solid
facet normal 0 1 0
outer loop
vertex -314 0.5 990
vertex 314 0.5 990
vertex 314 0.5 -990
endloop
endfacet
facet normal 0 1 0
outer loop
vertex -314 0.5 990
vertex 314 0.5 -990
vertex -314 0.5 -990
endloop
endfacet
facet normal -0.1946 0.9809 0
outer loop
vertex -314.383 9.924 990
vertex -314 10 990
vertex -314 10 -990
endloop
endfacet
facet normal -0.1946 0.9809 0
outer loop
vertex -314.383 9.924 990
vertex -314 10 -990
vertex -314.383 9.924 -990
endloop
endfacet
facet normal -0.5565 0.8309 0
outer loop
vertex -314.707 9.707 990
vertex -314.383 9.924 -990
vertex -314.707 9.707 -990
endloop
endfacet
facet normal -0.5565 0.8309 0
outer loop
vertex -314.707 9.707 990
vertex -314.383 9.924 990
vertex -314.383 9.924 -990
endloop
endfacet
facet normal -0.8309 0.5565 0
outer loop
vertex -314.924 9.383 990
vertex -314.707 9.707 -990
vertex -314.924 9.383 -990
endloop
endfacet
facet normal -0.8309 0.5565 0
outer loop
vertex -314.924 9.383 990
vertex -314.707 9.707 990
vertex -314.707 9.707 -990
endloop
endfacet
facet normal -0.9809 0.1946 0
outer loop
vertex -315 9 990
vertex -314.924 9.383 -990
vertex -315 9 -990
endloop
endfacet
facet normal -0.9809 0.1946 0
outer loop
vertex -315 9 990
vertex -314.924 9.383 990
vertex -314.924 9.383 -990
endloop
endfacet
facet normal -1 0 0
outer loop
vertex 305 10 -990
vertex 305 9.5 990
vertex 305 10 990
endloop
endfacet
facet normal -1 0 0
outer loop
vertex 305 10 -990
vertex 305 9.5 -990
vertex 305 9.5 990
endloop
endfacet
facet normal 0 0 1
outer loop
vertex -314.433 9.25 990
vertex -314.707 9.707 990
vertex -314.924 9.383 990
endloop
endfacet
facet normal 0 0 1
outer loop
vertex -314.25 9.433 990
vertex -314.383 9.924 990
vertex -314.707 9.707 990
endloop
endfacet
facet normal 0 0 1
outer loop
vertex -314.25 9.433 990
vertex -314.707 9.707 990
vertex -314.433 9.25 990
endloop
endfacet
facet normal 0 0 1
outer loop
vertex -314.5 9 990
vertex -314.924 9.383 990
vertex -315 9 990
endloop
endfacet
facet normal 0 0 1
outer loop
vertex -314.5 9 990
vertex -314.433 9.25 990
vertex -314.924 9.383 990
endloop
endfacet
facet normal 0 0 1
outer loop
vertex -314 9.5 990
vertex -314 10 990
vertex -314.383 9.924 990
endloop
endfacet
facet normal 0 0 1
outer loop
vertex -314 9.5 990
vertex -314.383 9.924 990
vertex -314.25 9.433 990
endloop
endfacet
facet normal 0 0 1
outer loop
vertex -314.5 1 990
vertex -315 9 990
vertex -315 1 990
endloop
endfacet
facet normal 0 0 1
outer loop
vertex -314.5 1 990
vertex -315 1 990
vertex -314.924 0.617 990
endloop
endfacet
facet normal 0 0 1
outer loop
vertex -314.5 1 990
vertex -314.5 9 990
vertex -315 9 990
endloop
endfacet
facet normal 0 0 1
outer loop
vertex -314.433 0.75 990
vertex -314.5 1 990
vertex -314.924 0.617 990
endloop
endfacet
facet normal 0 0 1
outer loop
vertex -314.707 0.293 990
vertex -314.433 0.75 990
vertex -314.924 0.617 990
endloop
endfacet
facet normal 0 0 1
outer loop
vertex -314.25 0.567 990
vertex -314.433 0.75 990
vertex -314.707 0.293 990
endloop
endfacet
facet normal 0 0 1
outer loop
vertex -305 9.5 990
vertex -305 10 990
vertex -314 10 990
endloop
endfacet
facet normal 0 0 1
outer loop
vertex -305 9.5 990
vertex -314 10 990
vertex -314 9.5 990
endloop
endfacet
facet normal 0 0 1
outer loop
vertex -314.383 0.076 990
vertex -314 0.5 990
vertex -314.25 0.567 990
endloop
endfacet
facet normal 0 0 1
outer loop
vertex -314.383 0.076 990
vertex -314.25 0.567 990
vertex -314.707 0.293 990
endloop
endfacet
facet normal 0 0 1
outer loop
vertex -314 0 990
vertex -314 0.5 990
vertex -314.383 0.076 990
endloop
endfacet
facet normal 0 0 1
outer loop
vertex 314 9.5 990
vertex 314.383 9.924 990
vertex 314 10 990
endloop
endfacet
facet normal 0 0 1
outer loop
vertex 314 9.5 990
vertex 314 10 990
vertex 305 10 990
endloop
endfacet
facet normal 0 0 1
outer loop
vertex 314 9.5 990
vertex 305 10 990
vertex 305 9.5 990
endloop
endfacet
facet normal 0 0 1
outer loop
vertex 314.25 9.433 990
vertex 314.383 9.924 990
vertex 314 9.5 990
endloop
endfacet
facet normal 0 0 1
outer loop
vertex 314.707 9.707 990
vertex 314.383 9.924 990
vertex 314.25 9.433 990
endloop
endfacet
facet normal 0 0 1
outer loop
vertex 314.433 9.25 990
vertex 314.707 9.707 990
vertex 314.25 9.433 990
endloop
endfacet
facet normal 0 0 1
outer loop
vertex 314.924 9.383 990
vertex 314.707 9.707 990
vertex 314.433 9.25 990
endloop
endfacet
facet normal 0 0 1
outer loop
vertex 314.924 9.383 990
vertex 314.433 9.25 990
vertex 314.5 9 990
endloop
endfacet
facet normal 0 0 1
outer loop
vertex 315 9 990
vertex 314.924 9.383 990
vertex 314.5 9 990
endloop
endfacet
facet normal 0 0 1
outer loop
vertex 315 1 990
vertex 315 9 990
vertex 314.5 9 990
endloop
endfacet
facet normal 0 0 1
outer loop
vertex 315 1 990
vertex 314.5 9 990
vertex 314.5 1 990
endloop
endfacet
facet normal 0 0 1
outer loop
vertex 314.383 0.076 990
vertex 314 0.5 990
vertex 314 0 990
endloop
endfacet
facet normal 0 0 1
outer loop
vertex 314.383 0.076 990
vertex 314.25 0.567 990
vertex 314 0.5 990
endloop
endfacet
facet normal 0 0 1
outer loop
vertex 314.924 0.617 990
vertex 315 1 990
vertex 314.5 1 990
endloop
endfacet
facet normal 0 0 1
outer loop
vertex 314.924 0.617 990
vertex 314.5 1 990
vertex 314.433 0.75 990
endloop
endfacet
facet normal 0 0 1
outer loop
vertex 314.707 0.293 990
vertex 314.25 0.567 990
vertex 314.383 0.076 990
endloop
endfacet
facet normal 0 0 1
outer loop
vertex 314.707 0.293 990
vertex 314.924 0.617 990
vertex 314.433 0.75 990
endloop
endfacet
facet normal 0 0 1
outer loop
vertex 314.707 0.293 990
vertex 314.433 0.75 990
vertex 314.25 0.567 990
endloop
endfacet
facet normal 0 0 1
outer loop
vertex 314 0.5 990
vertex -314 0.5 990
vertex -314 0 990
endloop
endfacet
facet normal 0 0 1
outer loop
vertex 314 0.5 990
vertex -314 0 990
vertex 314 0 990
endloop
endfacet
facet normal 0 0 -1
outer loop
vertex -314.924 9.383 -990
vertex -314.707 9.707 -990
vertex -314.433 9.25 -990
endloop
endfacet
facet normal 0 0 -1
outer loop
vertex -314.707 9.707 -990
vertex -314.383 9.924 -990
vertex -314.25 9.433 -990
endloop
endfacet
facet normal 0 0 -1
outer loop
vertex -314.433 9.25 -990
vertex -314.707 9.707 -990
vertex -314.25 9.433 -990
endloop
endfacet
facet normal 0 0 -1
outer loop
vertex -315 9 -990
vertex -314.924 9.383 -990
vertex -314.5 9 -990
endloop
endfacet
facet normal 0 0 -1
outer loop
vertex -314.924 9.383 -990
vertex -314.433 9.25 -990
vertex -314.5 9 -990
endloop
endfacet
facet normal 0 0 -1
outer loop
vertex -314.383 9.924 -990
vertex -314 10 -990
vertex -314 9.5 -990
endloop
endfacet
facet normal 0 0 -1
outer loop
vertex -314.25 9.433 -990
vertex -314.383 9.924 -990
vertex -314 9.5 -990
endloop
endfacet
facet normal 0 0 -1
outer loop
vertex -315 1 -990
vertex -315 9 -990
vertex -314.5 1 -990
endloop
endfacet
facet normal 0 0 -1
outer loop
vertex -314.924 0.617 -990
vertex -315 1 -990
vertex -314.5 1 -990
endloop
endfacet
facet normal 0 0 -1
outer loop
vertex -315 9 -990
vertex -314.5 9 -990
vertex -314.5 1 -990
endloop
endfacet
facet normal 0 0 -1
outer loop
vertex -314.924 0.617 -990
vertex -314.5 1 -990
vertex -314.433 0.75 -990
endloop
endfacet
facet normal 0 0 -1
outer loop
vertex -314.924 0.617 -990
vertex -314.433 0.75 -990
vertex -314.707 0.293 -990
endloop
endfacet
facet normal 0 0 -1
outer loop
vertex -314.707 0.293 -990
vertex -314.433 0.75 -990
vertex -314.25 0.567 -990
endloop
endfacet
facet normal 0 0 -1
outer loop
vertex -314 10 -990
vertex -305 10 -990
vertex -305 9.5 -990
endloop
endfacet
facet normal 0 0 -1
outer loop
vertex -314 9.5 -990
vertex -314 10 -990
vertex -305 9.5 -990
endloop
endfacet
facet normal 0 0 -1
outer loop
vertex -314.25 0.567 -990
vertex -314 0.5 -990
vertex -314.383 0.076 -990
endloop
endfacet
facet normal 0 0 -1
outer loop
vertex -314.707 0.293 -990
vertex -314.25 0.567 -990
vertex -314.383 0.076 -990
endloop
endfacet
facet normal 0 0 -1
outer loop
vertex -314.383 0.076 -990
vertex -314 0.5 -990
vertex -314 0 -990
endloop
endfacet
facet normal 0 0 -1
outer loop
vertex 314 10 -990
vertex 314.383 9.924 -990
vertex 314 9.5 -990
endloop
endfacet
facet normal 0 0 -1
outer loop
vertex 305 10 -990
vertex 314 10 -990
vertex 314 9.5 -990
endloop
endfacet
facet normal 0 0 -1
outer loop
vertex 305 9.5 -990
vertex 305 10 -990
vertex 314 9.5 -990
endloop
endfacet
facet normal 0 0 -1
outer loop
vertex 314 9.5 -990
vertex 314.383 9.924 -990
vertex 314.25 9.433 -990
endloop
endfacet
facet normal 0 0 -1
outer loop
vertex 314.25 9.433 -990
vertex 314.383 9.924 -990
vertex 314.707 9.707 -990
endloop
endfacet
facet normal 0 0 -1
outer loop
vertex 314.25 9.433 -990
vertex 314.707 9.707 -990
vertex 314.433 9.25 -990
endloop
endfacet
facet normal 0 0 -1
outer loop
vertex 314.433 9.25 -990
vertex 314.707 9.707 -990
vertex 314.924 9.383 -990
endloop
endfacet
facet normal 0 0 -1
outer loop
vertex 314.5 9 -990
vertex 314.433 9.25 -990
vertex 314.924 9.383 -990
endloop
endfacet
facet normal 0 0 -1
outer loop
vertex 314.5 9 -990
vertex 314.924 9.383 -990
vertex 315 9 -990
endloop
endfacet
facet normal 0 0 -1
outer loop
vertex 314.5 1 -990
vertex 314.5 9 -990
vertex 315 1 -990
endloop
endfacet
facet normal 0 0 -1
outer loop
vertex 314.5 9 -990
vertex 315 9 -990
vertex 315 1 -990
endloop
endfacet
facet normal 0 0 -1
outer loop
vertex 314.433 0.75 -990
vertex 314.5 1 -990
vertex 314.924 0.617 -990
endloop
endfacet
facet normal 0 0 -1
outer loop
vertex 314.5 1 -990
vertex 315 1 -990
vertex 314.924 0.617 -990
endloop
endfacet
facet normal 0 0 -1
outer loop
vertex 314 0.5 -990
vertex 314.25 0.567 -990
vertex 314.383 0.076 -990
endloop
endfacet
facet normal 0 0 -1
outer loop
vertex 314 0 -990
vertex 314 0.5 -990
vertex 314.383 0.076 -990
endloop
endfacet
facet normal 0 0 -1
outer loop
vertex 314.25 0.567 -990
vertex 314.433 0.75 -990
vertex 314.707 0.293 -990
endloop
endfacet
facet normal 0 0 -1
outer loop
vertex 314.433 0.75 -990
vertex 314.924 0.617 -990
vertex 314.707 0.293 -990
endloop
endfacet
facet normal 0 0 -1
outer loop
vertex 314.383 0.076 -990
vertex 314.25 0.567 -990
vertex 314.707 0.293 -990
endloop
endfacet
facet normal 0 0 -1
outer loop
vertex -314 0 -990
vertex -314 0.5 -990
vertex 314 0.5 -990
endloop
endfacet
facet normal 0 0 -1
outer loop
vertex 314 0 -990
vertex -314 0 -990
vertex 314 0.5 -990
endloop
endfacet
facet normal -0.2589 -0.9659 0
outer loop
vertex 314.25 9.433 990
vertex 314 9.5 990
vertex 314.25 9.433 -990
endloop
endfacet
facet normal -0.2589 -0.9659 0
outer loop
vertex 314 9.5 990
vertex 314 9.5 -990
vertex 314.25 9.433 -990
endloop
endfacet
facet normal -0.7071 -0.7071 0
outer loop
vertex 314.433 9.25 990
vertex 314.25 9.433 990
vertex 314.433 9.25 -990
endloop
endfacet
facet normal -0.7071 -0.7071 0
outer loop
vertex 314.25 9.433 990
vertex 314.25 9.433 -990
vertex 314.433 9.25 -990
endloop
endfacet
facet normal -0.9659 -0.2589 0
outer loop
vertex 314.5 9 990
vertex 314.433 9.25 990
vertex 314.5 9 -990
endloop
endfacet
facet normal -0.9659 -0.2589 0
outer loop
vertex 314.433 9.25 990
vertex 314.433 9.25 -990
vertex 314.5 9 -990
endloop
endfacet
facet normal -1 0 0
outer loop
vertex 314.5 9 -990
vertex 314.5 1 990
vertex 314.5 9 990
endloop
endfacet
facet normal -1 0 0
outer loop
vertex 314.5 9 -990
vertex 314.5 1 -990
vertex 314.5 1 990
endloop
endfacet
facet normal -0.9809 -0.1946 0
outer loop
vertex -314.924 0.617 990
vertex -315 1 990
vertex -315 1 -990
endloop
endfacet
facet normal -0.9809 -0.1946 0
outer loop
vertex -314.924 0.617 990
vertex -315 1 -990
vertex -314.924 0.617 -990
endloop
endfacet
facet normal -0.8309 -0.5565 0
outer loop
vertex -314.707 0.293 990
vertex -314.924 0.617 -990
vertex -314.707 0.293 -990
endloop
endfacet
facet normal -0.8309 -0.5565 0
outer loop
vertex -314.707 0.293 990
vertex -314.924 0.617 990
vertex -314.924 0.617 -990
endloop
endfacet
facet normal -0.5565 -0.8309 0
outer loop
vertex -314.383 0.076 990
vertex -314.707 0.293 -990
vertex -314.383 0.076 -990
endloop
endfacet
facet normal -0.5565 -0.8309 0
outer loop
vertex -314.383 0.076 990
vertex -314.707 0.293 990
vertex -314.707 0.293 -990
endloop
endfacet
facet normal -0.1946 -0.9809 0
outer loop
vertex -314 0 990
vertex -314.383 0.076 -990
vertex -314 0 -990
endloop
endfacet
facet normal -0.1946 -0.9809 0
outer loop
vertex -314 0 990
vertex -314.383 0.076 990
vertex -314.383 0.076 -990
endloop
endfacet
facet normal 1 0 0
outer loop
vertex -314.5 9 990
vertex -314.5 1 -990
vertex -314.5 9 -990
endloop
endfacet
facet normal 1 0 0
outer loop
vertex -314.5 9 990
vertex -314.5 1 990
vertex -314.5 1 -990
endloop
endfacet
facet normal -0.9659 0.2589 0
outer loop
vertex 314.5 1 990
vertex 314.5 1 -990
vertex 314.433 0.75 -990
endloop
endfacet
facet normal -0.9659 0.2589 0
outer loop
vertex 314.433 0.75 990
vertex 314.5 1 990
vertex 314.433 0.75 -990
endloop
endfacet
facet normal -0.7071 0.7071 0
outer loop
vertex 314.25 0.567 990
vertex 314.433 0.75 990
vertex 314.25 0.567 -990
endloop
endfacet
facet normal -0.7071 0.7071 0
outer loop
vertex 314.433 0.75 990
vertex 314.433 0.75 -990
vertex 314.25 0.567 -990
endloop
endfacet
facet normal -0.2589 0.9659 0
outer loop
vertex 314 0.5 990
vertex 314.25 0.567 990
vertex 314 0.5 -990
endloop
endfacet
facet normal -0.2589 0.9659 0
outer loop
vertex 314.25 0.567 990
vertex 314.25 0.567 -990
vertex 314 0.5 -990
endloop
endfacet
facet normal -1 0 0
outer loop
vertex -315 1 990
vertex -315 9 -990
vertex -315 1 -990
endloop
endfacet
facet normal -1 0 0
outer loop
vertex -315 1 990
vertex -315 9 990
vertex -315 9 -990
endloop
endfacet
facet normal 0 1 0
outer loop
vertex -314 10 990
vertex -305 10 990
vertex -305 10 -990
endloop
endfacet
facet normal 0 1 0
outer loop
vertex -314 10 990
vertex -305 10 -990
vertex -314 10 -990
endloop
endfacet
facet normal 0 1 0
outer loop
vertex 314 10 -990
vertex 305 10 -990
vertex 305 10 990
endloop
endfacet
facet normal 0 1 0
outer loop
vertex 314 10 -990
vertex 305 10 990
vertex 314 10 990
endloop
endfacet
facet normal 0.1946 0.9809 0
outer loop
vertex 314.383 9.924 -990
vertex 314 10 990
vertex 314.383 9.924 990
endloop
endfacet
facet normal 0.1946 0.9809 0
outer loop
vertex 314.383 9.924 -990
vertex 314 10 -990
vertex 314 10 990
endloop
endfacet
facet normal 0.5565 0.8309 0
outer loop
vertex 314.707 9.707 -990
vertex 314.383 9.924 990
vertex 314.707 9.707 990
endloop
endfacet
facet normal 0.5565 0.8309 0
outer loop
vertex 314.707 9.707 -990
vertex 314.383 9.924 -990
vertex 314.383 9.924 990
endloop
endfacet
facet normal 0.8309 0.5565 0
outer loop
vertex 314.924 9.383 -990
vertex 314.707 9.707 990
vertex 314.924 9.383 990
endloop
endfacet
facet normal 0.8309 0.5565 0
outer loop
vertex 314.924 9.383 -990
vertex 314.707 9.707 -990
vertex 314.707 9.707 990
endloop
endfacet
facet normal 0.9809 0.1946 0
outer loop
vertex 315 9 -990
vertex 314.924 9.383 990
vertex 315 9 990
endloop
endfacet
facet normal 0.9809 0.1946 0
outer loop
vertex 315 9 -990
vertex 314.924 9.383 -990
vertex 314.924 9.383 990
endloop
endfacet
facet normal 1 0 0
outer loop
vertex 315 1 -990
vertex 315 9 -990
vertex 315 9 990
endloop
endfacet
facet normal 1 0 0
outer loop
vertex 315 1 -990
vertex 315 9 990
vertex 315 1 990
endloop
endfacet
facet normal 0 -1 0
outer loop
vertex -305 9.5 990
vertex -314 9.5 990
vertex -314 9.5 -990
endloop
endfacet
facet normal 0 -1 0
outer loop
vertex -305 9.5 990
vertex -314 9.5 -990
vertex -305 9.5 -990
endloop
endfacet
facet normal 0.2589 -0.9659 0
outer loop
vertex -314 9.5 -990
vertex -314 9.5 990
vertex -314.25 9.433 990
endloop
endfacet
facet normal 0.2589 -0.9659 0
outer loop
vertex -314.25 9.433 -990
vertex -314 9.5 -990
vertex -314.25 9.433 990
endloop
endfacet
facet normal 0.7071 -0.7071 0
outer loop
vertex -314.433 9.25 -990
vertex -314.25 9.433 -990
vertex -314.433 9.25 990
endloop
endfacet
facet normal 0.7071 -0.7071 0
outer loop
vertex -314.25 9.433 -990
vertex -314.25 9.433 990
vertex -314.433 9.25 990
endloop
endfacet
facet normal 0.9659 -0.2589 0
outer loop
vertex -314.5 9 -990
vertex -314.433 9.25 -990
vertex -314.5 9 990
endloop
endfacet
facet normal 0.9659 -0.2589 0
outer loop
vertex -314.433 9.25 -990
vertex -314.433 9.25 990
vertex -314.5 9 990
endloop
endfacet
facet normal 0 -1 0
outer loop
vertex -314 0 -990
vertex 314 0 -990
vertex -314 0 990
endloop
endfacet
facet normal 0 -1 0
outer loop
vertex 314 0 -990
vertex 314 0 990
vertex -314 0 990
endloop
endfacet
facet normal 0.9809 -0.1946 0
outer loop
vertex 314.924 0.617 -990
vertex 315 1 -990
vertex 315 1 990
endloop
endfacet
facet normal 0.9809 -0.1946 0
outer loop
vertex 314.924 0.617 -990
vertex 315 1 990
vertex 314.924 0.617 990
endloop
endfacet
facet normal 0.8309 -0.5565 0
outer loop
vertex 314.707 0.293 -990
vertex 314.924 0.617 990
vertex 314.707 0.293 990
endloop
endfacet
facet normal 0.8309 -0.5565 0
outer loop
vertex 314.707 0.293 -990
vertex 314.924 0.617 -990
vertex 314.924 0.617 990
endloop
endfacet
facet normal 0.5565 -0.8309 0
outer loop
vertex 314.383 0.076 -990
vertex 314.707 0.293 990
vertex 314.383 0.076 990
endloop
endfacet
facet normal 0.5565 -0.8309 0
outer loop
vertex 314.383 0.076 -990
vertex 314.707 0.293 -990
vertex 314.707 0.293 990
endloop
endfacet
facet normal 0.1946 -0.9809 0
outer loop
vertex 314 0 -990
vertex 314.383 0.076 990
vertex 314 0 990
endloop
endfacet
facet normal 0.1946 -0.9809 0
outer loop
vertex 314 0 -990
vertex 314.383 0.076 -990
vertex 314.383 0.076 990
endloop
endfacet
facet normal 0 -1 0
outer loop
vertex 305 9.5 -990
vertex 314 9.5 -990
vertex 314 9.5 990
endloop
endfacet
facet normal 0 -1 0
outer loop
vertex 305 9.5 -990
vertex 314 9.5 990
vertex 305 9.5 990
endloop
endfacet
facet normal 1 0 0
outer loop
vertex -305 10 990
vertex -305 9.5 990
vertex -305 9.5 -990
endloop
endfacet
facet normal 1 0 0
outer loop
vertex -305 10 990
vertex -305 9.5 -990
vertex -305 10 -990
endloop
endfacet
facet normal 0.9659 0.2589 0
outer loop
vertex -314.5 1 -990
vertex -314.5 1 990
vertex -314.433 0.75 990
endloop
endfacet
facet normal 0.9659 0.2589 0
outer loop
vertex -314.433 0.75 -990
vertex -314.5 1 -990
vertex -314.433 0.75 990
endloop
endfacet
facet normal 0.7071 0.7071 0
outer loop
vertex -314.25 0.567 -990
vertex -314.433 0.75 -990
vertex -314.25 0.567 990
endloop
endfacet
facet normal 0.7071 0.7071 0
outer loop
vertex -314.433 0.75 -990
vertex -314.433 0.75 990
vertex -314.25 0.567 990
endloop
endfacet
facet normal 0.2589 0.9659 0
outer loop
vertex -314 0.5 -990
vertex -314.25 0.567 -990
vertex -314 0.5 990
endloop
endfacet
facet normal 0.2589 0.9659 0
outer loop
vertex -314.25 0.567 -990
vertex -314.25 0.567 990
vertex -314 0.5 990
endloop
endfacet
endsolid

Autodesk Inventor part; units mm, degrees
ref_plane "YZ Plane" through (0, 0, 0) normal (1, 0, 0) x (0, 1, 0)
ref_plane "XZ Plane" through (0, 0, 0) normal (0, 1, 0) x (-1, 0, 0)
ref_plane "XY Plane" through (0, 0, 0) normal (0, 0, 1) x (1, 0, 0)
sketch "Sketch6" plane through (0, 0, 0) normal (0, 1, 0) x (-1, 0, 0)
  line L0 (315, -990) -> (-315, -990)
  line L1 (-315, -990) -> (-315, 990)
  line L2 (-315, 990) -> (315, 990)
  line L3 (315, 990) -> (315, -990)
  line L4 (315, -990) -> (-315, 990) construction
  line L5 (-315, -990) -> (315, 990) construction
  point P0 (0, 0)
  dimension "d52" = 630
  dimension "d53" = 1980
extrude "Plate2" add sketch "Sketch6" along normal blind 0.5
sketch "Sketch11" plane through (314.5, 0, -990) normal (1, 0, 0) x (0, 1, 0)
  line L0 (0, 1980) -> (0, 0)
  line L1 (0, 0) -> (10, 0)
  line L2 (10, 0) -> (10, 1980)
  line L3 (10, 1980) -> (0, 1980)
edge flange "Flange2" height 10 angle 90 thickness 0.5 bend radius 0.5 thickness toward (1, 0, 0) relief tear relief width 0.5 relief depth 0.25 edges at (315, 0.5, 0) wall of the first edge with corners at (314.5, 0, 990) (314.5, 0, -990) (314.5, 10, -990) (314.5, 10, 990)
bend "Bend3"
corner "Corner3"
sketch "Sketch12" plane through (315, 9.5, -990) normal (0, 1, 0) x (-1, 0, 0)
  line L0 (0, 1980) -> (0, 0)
  line L1 (0, 0) -> (10, 0)
  line L2 (10, 0) -> (10, 1980)
  line L3 (10, 1980) -> (0, 1980)
edge flange "Flange3" height 10 angle 90 thickness 0.5 bend radius 0.5 thickness toward (0, 1, 0) relief tear relief width 0.5 relief depth 0.25 edges at (314.5, 10, 0) wall of the first edge with corners at (315, 9.5, 990) (315, 9.5, -990) (305, 9.5, -990) (305, 9.5, 990)
bend "Bend4"
corner "Corner4"
sketch "Sketch13" plane through (-314.5, 0, 990) normal (-1, 0, 0) x (0, -1, 0)
  line L0 (0, -1980) -> (0, 0)
  line L1 (0, 0) -> (-10, 0)
  line L2 (-10, 0) -> (-10, -1980)
  line L3 (-10, -1980) -> (0, -1980)
edge flange "Flange4" height 10 angle 90 thickness 0.5 bend radius 0.5 thickness toward (-1, 0, 0) relief tear relief width 0.5 relief depth 0.25 edges at (-315, 0.5, 0) wall of the first edge with corners at (-314.5, 0, -990) (-314.5, 0, 990) (-314.5, 10, 990) (-314.5, 10, -990)
bend "Bend5"
corner "Corner5"
sketch "Sketch14" plane through (-315, 9.5, 990) normal (0, 1, 0) x (-1, 0, 0)
  line L0 (0, -1980) -> (0, 0)
  line L1 (0, 0) -> (-10, 0)
  line L2 (-10, 0) -> (-10, -1980)
  line L3 (-10, -1980) -> (0, -1980)
edge flange "Flange5" height 10 angle 90 thickness 0.5 bend radius 0.5 thickness toward (0, 1, 0) relief tear relief width 0.5 relief depth 0.25 edges at (-314.5, 10, 0) wall of the first edge with corners at (-315, 9.5, -990) (-315, 9.5, 990) (-305, 9.5, 990) (-305, 9.5, -990)
bend "Bend6"
corner "Corner6"
equation "\"d53\" = ЖАБРЫ_базовая_длина_дл_лист"
equation "\"d54\" = Thickness"
equation "\"d84\" = BendReliefWidth"
equation "\"d85\" = BendReliefDepth"
equation "\"d86\" = MinimumRemnant"
equation "\"d87\" = TransitionRadius"
equation "\"d90\" = BendRadius"
equation "\"d91\" = CornerReliefSize"
equation "\"d92\" = GapSize"
equation "\"d93\" = JacobiRadiusSize"
equation "\"d94\" = BendReliefWidth"
equation "\"d95\" = BendReliefDepth"
equation "\"d96\" = MinimumRemnant"
equation "\"d97\" = TransitionRadius"
equation "\"d100\" = BendRadius"
equation "\"d101\" = CornerReliefSize"
equation "\"d102\" = GapSize"
equation "\"d103\" = JacobiRadiusSize"
equation "\"d104\" = BendReliefWidth"
equation "\"d105\" = BendReliefDepth"
equation "\"d106\" = MinimumRemnant"
equation "\"d107\" = TransitionRadius"
equation "\"d110\" = BendRadius"
equation "\"d111\" = CornerReliefSize"
equation "\"d112\" = GapSize"
equation "\"d113\" = JacobiRadiusSize"
equation "\"d114\" = BendReliefWidth"
equation "\"d115\" = BendReliefDepth"
equation "\"d116\" = MinimumRemnant"
equation "\"d117\" = TransitionRadius"
equation "\"d120\" = BendRadius"
equation "\"d121\" = CornerReliefSize"
equation "\"d122\" = GapSize"
equation "\"d123\" = JacobiRadiusSize"
equation "\"BendRadius\" = Thickness"
equation "\"BendReliefWidth\" = Thickness"
equation "\"BendReliefDepth\" = 0.5 * Thickness"
equation "\"CornerReliefSize\" = 4 * Thickness"
equation "\"MinimumRemnant\" = 2 * Thickness"
equation "\"TransitionRadius\" = BendRadius"
equation "\"JacobiRadiusSize\" = BendRadius"
equation "\"GapSize\" = Thickness"
equation "\"ЖАБРЫ_базовая_длина_дл_лист\" = 1980"
equation "\"Thickness\" = 0.5"
properties part number "MSC 808 sheet gills" material "Stainless Steel"
